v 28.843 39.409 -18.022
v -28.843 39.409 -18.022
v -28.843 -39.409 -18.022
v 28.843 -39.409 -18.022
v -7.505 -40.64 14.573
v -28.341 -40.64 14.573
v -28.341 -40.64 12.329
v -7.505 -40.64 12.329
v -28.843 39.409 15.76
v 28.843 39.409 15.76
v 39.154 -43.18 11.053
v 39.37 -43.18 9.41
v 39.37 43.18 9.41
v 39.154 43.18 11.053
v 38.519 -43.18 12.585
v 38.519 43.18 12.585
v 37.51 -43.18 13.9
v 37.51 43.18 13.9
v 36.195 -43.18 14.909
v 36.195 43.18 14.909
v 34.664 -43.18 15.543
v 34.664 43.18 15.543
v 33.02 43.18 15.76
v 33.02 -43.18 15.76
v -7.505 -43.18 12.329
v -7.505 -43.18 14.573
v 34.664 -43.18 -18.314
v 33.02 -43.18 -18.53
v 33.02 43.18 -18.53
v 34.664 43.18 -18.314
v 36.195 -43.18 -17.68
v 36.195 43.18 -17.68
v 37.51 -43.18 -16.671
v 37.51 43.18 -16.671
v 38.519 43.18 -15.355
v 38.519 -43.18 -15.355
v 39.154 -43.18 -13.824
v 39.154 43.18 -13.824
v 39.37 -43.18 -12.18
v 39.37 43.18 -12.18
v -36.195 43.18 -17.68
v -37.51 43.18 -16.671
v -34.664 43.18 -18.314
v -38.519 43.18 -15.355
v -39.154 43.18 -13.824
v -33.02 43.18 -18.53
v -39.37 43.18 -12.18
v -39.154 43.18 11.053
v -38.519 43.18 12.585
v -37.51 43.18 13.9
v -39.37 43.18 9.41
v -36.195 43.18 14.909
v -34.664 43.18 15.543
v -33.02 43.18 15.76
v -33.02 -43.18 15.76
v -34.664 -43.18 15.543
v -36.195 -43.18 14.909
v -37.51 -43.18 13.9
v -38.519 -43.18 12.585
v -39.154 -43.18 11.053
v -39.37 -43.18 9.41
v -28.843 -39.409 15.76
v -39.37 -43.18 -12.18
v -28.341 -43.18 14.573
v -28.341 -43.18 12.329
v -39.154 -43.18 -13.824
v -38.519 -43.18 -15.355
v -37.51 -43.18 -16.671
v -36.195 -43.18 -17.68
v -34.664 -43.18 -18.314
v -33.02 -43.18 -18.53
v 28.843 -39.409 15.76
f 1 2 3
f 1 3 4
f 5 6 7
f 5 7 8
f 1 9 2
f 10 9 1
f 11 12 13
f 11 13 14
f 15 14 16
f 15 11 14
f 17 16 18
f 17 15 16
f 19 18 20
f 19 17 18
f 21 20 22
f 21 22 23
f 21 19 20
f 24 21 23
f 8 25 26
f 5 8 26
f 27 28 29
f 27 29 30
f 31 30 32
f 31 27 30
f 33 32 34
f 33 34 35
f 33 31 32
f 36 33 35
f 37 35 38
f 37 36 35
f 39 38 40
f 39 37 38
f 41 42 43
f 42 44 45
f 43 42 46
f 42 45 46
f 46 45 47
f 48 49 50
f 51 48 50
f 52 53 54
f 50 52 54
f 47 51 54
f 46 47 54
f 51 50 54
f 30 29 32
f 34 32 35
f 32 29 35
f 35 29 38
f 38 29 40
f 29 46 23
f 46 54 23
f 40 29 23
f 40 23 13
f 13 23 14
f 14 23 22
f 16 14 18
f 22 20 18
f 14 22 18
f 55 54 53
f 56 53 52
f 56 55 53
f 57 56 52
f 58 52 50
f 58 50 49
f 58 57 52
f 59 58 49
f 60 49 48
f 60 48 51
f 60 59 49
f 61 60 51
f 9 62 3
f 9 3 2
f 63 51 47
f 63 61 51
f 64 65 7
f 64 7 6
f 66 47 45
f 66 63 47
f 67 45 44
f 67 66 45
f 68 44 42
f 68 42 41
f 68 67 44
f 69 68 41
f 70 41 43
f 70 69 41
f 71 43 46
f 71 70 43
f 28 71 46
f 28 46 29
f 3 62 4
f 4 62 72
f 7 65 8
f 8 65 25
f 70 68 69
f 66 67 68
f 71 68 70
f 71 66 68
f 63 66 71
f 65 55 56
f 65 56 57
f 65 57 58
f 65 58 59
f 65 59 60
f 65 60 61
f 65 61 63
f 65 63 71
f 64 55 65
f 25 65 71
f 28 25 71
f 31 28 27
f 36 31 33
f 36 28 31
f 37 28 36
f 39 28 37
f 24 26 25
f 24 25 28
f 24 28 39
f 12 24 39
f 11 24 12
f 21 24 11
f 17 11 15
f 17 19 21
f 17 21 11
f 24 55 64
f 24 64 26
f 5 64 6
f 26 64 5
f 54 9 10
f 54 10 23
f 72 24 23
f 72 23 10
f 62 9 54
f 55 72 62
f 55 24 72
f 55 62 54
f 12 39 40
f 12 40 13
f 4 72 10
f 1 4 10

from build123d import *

# Parameters (mm, degrees)
F1_DEPTH = 43.18
F2_W     = 57.685676
F2_H     = 78.818068
F3_DEPTH = 33.782
F4_W     = 20.835391
F4_H     = 2.243813
F5_DEPTH = 2.54


with BuildPart() as f1:
    # F0 (on Front) → F1 (new body, symmetric)
    with BuildSketch(Plane.XZ):
        with BuildLine():
            ThreePointArc((-39.37, -12.180453), (-37.510128, -16.670581), (-33.02, -18.530453))
            Line((-33.02, -18.530453), (33.02, -18.530453))
            ThreePointArc((33.02, -18.530453), (37.510128, -16.670581), (39.37, -12.180453))
            Line((39.37, -12.180453), (39.37, 9.409547))
            ThreePointArc((39.37, 9.409547), (37.510128, 13.899675), (33.02, 15.759547))
            Line((33.02, 15.759547), (-33.02, 15.759547))
            ThreePointArc((-33.02, 15.759547), (-37.510128, 13.899675), (-39.37, 9.409547))
            Line((-39.37, 9.409547), (-39.37, -12.180453))
        make_face()
    extrude(amount=F1_DEPTH, both=True)

    # F2 (on face) → F3 (cut)
    with BuildSketch(Plane.XY.offset(15.759547)):
        Rectangle(F2_W, F2_H)
    extrude(amount=-F3_DEPTH, mode=Mode.SUBTRACT)

    # F4 (on face) → F5 (cut)
    with BuildSketch(Plane.XZ.offset(43.18)):
        with Locations((-17.922866, 13.451327)):
            Rectangle(F4_W, F4_H)
    extrude(amount=-F5_DEPTH, mode=Mode.SUBTRACT)


solid = f1.part
